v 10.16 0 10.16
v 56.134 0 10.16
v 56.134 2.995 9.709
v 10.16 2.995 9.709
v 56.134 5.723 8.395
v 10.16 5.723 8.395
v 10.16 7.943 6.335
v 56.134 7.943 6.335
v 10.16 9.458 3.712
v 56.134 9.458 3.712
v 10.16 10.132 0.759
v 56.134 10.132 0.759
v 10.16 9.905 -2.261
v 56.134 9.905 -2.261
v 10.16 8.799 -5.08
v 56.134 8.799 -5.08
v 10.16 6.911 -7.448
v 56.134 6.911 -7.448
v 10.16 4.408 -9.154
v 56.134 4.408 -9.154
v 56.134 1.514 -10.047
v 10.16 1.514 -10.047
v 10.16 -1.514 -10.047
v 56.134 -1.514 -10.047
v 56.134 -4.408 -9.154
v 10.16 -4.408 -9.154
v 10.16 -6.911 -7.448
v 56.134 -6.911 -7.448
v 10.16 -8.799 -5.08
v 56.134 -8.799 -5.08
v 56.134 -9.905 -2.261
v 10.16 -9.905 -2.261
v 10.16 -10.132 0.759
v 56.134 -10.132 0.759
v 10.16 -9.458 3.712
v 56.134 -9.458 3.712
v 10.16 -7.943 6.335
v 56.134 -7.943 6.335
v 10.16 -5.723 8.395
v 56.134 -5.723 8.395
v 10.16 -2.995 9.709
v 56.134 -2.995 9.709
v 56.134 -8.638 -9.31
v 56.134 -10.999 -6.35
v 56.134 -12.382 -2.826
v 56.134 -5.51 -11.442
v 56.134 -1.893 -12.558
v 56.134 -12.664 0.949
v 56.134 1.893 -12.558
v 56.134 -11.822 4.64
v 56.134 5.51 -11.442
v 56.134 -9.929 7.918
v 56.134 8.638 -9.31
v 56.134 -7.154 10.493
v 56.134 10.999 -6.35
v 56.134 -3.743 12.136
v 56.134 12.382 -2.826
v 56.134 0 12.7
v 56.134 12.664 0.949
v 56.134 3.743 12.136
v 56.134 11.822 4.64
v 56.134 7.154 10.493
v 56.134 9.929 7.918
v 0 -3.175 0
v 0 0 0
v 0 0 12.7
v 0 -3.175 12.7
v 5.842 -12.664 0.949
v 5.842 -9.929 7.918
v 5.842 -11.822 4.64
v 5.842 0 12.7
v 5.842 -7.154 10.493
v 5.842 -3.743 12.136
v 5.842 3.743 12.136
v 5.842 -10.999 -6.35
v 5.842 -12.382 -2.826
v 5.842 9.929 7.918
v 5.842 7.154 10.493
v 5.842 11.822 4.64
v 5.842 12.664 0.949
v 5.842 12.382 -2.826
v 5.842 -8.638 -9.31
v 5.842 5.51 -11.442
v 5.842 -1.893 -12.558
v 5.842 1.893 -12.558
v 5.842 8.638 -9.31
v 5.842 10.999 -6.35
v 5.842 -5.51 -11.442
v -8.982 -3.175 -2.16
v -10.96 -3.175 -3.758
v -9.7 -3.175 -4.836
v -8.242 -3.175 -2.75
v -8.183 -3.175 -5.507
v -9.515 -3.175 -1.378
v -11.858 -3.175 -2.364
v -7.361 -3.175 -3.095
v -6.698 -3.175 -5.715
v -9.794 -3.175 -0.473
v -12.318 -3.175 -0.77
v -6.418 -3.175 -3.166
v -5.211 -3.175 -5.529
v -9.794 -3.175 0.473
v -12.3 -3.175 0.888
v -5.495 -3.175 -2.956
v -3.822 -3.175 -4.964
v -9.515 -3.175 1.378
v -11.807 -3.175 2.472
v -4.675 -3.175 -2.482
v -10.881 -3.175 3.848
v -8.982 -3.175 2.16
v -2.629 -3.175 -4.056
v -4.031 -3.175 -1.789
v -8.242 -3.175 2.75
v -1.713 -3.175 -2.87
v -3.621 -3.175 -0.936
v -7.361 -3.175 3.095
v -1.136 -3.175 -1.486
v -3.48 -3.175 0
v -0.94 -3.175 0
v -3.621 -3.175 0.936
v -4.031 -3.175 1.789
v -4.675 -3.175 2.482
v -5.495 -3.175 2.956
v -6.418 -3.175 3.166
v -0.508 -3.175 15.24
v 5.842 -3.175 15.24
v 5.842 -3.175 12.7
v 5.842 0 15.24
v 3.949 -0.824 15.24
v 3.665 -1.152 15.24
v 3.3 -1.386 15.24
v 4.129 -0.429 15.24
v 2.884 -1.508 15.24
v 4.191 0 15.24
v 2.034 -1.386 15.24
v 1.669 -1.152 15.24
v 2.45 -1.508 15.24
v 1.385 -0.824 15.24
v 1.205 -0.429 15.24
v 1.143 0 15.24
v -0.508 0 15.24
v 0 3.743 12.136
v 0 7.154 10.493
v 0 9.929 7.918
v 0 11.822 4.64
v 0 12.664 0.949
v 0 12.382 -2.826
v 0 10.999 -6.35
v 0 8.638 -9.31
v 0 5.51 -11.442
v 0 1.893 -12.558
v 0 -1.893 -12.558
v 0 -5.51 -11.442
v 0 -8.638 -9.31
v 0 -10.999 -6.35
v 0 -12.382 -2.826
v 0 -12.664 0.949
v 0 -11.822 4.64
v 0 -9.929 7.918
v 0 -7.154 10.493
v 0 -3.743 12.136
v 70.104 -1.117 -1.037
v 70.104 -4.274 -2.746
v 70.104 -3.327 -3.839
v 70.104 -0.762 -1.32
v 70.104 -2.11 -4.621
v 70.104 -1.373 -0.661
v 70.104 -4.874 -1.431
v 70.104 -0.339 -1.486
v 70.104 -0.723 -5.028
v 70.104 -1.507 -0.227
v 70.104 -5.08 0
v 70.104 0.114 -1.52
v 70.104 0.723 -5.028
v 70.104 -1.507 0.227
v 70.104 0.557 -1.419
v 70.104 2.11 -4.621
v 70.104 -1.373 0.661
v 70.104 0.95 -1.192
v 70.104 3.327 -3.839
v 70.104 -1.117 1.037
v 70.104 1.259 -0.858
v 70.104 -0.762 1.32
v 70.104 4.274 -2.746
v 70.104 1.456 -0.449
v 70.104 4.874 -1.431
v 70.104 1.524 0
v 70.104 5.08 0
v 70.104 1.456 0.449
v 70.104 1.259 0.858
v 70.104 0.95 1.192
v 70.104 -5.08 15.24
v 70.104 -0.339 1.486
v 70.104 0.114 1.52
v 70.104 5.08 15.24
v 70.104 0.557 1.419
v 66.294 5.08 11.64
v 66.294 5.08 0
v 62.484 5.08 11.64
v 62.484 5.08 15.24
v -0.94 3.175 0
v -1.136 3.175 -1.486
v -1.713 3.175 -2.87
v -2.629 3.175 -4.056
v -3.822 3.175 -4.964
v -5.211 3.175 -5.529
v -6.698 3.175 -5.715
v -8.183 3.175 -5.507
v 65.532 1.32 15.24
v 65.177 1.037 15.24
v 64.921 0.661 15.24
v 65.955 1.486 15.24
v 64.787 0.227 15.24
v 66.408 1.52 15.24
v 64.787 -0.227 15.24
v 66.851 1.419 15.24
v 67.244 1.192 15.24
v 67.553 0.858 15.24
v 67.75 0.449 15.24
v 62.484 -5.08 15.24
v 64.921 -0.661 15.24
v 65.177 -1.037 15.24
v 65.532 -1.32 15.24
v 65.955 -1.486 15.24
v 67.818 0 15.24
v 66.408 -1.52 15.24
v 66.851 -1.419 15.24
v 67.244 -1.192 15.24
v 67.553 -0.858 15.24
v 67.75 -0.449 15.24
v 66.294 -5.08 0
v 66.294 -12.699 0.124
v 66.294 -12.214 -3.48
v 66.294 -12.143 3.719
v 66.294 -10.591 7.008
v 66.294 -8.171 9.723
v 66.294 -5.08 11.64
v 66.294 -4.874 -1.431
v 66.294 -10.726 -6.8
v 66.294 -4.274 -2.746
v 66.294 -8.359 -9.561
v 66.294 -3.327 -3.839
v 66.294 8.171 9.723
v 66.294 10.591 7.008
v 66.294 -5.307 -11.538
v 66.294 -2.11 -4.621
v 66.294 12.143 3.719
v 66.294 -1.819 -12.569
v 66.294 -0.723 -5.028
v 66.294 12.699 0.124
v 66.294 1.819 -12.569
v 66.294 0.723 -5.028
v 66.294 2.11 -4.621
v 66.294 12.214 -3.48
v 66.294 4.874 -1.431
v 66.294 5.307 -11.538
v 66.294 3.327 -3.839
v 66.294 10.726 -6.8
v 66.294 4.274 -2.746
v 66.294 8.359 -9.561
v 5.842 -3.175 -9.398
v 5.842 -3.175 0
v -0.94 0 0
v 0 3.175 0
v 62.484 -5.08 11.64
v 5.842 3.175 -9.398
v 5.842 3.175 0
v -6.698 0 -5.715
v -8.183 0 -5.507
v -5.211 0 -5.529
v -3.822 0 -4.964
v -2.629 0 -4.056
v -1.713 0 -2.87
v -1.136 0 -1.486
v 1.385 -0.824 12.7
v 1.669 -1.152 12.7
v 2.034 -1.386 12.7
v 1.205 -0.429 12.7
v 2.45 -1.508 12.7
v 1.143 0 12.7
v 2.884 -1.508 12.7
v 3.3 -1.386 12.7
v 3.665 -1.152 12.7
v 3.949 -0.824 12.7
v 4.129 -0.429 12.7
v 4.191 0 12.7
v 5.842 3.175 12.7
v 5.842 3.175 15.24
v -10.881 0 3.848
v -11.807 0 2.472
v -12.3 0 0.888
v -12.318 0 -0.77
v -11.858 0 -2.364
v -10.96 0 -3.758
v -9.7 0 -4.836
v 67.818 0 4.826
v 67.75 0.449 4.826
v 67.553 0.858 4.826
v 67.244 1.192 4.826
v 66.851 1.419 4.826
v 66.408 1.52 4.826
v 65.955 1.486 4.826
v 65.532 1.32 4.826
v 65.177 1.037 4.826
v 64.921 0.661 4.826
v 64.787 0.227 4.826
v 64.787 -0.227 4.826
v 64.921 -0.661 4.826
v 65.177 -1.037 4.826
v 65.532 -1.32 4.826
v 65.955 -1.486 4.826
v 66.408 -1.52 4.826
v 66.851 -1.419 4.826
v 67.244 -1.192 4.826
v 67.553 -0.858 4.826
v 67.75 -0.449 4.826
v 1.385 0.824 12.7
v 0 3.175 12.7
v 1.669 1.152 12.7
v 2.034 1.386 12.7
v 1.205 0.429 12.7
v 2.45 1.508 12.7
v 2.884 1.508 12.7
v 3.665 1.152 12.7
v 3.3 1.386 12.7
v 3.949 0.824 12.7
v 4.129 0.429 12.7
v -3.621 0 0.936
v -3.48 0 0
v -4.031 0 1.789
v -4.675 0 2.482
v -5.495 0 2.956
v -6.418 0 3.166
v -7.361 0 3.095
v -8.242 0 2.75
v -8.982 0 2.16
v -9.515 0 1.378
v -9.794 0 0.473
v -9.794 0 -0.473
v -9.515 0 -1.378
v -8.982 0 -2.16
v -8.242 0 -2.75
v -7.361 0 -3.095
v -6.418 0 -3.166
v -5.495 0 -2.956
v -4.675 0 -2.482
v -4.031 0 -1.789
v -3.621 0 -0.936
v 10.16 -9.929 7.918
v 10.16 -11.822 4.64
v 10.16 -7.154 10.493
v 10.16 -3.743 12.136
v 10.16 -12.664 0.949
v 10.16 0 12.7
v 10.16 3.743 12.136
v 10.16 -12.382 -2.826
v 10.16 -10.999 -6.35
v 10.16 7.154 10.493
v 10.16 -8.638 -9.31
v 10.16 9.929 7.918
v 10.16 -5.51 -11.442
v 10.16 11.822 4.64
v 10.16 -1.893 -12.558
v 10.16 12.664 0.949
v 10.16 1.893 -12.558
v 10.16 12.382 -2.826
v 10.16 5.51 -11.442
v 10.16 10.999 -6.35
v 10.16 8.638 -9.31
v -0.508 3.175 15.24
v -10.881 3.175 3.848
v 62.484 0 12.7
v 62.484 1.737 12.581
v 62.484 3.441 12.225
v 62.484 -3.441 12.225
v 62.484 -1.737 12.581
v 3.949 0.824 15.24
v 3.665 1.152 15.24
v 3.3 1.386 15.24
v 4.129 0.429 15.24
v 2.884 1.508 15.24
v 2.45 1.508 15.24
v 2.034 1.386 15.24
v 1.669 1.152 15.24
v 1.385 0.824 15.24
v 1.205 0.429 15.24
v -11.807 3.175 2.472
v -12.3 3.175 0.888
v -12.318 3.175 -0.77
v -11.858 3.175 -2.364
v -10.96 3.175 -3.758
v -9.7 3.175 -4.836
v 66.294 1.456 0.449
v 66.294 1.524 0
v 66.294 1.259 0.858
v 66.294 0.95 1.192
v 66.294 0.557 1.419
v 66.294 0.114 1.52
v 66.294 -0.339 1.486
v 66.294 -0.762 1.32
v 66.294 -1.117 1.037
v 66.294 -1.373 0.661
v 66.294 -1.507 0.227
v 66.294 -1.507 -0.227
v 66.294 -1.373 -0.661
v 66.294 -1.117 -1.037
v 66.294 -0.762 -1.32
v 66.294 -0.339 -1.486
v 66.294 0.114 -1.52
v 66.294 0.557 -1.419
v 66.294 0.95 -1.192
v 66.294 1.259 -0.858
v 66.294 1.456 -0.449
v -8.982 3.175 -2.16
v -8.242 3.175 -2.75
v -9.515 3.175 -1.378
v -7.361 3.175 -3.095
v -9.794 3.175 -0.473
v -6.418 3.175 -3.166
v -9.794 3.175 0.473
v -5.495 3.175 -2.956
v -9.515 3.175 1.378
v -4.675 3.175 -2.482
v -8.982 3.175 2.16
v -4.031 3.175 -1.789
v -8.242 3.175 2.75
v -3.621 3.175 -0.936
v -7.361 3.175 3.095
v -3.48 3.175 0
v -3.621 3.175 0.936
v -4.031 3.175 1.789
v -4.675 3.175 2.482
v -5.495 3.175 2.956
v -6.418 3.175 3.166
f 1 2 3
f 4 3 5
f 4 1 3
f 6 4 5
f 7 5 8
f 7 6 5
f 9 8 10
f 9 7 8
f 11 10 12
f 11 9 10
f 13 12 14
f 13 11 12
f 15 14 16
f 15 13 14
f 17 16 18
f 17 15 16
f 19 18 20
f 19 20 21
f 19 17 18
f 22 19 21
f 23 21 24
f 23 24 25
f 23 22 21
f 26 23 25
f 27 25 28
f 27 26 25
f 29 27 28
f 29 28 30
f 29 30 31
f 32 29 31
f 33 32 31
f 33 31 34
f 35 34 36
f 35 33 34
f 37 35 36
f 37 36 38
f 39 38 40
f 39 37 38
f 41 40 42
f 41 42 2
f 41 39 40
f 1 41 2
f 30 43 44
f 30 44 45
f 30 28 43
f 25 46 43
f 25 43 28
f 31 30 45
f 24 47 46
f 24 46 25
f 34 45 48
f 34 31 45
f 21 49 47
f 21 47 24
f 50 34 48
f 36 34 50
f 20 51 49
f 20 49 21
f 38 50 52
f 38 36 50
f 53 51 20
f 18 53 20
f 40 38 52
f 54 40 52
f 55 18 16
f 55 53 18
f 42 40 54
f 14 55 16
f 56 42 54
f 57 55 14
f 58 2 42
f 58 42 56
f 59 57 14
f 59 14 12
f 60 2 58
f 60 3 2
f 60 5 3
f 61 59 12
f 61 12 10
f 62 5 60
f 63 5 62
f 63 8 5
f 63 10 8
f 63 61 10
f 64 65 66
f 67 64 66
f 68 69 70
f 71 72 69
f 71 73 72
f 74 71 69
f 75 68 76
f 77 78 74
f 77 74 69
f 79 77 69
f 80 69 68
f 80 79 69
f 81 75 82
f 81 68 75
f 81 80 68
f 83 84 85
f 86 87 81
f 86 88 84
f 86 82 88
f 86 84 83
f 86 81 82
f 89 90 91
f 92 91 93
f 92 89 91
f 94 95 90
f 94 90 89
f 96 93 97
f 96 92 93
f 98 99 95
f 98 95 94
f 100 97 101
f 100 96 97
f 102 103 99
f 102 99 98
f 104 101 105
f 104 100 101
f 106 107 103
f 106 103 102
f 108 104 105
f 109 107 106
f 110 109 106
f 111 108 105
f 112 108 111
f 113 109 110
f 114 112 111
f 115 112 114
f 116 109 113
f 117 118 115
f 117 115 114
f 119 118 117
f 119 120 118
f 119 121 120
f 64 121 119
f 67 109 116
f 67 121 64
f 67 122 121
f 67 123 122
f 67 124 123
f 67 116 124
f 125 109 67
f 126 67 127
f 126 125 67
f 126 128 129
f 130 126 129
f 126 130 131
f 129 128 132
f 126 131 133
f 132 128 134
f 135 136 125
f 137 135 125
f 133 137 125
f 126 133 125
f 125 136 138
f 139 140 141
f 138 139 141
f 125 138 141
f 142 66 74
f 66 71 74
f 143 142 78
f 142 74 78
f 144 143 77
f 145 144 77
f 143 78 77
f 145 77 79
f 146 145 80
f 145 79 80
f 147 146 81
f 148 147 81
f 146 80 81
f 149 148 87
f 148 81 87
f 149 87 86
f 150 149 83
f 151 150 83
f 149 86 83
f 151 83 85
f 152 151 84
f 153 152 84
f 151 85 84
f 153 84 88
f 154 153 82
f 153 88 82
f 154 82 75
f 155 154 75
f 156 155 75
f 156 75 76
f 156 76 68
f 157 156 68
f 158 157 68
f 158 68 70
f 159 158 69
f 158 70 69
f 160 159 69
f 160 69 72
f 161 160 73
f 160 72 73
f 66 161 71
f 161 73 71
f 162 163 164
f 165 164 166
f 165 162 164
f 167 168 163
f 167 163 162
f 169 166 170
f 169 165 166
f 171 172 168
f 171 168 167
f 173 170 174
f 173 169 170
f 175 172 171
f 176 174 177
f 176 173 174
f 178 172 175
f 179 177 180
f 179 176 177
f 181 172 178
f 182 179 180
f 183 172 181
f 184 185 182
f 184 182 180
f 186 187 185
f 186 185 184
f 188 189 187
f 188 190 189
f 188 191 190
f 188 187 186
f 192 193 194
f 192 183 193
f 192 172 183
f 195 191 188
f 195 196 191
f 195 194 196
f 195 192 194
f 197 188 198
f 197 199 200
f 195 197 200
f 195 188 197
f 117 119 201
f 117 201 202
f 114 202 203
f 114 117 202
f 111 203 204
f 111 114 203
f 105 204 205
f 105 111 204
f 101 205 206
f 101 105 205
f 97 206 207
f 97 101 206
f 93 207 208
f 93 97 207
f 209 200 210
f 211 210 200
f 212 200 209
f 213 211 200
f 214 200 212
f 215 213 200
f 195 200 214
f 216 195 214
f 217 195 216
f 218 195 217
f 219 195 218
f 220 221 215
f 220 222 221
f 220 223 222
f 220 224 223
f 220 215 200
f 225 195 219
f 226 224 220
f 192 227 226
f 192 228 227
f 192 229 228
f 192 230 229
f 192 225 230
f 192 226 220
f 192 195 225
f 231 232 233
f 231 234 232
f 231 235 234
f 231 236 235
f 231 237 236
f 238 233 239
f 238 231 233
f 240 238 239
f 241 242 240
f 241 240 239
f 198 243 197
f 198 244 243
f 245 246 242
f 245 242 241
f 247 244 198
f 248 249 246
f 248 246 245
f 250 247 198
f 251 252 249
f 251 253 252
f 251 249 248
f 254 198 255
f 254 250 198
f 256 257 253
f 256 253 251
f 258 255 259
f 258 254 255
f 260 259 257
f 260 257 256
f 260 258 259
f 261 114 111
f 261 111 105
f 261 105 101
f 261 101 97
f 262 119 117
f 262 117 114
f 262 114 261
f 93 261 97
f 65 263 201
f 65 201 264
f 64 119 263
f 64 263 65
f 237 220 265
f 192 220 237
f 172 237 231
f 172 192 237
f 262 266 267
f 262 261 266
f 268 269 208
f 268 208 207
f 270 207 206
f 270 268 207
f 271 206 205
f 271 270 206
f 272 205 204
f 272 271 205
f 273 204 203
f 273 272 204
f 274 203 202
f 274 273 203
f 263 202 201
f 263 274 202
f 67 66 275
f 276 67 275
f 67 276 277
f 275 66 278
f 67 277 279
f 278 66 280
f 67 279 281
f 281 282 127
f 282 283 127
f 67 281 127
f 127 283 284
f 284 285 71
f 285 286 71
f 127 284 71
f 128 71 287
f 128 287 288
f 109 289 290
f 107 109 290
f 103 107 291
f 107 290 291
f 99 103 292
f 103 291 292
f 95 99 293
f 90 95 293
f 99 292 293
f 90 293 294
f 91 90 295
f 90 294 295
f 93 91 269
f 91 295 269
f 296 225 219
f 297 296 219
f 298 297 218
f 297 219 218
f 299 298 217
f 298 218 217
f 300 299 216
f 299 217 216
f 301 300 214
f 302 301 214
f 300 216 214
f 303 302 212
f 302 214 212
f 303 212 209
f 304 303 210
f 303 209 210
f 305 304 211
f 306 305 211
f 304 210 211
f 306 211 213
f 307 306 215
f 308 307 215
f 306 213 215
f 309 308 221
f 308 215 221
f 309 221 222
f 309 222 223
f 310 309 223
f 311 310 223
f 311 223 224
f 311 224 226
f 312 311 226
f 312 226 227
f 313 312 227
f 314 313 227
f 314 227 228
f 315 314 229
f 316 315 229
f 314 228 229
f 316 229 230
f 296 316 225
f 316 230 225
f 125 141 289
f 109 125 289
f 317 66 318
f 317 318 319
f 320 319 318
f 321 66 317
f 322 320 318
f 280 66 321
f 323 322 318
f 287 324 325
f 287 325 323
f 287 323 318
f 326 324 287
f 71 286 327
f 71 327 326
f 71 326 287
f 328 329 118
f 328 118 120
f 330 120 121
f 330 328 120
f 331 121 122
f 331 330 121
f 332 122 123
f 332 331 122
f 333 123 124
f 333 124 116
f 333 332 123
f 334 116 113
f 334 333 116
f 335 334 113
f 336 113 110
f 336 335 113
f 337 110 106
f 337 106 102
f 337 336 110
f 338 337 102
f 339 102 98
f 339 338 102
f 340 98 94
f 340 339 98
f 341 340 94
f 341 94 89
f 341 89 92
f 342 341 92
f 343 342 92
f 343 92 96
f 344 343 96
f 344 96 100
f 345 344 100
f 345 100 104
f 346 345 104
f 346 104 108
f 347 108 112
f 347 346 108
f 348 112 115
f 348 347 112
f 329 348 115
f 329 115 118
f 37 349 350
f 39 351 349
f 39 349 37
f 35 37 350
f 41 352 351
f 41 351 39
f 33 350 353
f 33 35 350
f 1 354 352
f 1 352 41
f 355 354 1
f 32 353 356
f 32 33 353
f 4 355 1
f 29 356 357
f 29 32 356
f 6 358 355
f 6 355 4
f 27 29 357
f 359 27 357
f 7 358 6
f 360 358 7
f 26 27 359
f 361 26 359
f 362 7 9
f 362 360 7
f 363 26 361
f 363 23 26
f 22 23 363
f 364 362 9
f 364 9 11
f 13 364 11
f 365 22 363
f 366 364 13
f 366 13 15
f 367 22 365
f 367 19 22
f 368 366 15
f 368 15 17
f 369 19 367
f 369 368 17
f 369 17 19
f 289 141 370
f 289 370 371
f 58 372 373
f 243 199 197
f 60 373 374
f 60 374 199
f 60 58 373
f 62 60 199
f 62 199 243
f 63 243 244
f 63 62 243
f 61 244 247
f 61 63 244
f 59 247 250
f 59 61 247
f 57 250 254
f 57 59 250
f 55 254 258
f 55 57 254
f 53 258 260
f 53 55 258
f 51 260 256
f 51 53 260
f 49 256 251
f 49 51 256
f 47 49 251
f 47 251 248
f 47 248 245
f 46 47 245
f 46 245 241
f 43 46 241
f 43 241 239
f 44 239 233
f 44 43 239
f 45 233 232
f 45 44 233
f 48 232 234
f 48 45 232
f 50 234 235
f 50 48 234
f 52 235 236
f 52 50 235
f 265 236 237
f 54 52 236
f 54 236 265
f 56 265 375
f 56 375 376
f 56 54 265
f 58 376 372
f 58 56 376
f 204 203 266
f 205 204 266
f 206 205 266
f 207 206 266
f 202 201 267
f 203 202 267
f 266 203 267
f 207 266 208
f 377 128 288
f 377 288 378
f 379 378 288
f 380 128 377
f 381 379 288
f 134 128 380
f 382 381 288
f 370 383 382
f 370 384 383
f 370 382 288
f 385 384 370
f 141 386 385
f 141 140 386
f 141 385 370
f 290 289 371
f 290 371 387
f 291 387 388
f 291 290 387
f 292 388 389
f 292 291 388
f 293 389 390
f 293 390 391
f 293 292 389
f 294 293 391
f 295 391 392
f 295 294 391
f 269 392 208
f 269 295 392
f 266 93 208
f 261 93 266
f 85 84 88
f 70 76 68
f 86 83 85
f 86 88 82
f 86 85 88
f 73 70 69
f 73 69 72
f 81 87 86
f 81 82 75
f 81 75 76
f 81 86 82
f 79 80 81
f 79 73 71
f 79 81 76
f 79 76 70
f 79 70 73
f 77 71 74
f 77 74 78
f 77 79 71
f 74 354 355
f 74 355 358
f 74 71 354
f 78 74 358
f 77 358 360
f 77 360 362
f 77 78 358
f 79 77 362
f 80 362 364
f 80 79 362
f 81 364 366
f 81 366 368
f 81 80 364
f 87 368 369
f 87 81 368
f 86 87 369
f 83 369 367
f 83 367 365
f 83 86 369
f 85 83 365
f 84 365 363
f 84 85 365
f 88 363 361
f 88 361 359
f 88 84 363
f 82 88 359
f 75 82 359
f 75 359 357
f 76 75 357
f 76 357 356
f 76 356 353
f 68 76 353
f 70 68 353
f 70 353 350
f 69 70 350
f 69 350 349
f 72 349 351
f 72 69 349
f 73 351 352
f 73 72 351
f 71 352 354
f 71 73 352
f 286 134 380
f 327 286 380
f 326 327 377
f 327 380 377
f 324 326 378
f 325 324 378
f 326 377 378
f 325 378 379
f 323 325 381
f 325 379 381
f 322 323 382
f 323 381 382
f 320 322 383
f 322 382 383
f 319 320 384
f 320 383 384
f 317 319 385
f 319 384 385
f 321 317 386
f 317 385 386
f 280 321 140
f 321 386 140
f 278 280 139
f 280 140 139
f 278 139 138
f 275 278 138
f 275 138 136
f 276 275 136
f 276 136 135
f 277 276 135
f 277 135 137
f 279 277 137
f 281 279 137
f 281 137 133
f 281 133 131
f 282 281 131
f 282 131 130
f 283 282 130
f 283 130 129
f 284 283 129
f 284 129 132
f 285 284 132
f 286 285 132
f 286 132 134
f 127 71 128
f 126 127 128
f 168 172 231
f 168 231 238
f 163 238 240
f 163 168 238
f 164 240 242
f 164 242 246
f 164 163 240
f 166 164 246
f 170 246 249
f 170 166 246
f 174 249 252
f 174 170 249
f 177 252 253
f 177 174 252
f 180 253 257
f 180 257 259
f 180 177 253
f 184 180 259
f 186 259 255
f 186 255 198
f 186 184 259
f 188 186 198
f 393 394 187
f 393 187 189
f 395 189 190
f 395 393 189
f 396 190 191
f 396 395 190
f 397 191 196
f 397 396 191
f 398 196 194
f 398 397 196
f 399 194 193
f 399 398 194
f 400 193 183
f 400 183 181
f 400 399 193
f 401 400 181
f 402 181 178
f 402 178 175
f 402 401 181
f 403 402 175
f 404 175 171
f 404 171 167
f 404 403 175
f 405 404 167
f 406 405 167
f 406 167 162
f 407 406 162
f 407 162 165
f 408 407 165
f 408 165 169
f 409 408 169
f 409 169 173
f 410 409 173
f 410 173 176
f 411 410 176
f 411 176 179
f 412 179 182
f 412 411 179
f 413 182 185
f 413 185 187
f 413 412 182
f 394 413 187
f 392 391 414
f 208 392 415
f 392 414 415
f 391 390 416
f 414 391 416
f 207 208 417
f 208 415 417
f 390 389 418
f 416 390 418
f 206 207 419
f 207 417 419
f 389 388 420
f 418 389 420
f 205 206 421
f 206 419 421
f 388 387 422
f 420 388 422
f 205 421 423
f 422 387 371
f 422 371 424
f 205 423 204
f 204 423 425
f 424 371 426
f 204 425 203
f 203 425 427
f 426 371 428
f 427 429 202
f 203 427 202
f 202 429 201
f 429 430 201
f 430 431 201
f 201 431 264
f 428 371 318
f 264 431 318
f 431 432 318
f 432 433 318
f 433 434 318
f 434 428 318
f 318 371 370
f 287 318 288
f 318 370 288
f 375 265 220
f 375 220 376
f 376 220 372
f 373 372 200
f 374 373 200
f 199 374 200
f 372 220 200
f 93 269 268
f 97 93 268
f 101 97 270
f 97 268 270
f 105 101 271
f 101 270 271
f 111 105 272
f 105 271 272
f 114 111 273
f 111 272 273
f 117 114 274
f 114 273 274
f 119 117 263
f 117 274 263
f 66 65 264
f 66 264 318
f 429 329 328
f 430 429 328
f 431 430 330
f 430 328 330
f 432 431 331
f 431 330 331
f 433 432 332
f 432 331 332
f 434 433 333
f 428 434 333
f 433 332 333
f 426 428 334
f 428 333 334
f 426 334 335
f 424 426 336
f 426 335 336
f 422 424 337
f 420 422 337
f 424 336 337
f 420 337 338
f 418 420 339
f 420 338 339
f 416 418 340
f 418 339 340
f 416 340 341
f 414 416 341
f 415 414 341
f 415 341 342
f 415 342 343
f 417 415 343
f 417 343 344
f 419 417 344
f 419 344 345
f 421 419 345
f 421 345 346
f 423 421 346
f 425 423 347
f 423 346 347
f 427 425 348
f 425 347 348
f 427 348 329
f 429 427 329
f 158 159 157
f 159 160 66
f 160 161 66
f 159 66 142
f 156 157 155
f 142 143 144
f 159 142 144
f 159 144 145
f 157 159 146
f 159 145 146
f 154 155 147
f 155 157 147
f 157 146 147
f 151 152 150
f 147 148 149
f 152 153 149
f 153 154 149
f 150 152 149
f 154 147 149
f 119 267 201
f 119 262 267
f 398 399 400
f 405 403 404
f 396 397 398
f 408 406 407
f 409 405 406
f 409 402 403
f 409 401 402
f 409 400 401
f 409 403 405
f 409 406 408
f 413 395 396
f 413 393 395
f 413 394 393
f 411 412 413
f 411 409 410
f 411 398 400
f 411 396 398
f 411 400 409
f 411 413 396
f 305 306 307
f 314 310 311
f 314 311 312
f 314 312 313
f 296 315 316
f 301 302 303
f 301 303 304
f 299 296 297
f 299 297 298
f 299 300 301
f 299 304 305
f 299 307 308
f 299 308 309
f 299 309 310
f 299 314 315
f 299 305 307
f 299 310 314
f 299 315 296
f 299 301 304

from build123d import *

# Parameters (mm, degrees)
F0_R      = 3.175
F1_DEPTH  = 3.175
F0_W      = 5.842
F0_H      = 12.7
F4_DEPTH  = 3.175
F5_R      = 1.524
F6_DEPTH  = 3.81
F7_R      = 1.524
F8_DEPTH  = 10.414
F9_R      = 1.524
F10_DEPTH = 17.78


with BuildPart() as f1:
    # F0 (on Front) → F1 (new body, symmetric)
    with BuildSketch(Plane.XZ):
        with BuildLine():
            Line((-0.9398, 0), (0, 0))
            Line((0, 0), (0, 12.7))
            Line((0, 12.7), (5.842, 12.7))
            Line((5.842, 12.7), (5.842, 15.24))
            Line((5.842, 15.24), (-0.508, 15.24))
            Line((-0.508, 15.24), (-10.8806298187, 3.8475430269))
            ThreePointArc((-10.8806298187, 3.8475430269), (-4.5919612295, 5.3297205562), (-0.9398, 0))
        make_face()
        with BuildLine():
            ThreePointArc((-8.1826630726, -5.5069827884), (-3.1957909266, -4.5493385486), (-0.9398, 0))
            ThreePointArc((-0.9398, 0), (-4.5919612295, 5.3297205562), (-10.8806298187, 3.8475430269))
            ThreePointArc((-10.8806298187, 3.8475430269), (-12.1459778134, -1.5837270034), (-8.1826630726, -5.5069827884))
        make_face()
        with Locations((-6.6548, 0)):
            Circle(F0_R, mode=Mode.SUBTRACT)
    extrude(amount=F1_DEPTH, both=True)

    # F9 (on face) → F10 (cut)
    with BuildSketch(Plane.XY.offset(15.24)):
        with Locations((2.667, 0)):
            Circle(F9_R)
    extrude(amount=-F10_DEPTH, mode=Mode.SUBTRACT)


with BuildPart() as f2:
    # F0 (on Front) → F2 (revolve)
    with BuildSketch(Plane.XZ):
        Polygon((5.842, 12.7), (5.842, 0), (66.294, 0), (66.294, 12.7), (56.134, 12.7), (56.134, 10.16), (10.16, 10.16), (10.16, 12.7), align=None)
    revolve(axis=Axis((-3.3274, 0, 0), (-1, 0, 0)))

    # F5 (on face) → F6 (join, symmetric)
    with BuildSketch(Plane.YZ.offset(66.294)):
        with BuildLine():
            ThreePointArc((-5.08, 0), (0, -5.08), (5.08, 0))
            ThreePointArc((5.08, 0), (0, 5.08), (-5.08, 0))
        make_face()
        Circle(F5_R, mode=Mode.SUBTRACT)
        with BuildLine():
            ThreePointArc((-5.08, 0), (0, 5.08), (5.08, 0))
            Line((5.08, 0), (5.08, 15.24))
            Line((5.08, 15.24), (-5.08, 15.24))
            Line((-5.08, 15.24), (-5.08, 0))
        make_face()
    extrude(amount=F6_DEPTH, both=True)

    # F7 (on face) → F8 (cut)
    with BuildSketch(Plane.XY.offset(15.24)):
        with Locations((66.294, 0)):
            Circle(F7_R)
    extrude(amount=-F8_DEPTH, mode=Mode.SUBTRACT)


with BuildPart() as f3:
    # F0 (on Front) → F3 (revolve)
    with BuildSketch(Plane.XZ):
        with Locations((2.921, 6.35)):
            Rectangle(F0_W, F0_H)
    revolve(axis=Axis((-3.3274, 0, 0), (-1, 0, 0)))


with BuildPart() as f4:
    # F0 (on Front) → F4 (new body, symmetric)
    with BuildSketch(Plane.XZ):
        with BuildLine():
            Line((5.842, 0), (0, 0))
            Line((0, 0), (-0.9398, 0))
            ThreePointArc((-0.9398, 0), (-3.1957909266, -4.5493385486), (-8.1826630726, -5.5069827884))
            Line((-8.1826630726, -5.5069827884), (5.842, -9.398))
            Line((5.842, -9.398), (5.842, 0))
        make_face()
    extrude(amount=F4_DEPTH, both=True)


solid = Compound([f1.part, f2.part, f3.part, f4.part])
